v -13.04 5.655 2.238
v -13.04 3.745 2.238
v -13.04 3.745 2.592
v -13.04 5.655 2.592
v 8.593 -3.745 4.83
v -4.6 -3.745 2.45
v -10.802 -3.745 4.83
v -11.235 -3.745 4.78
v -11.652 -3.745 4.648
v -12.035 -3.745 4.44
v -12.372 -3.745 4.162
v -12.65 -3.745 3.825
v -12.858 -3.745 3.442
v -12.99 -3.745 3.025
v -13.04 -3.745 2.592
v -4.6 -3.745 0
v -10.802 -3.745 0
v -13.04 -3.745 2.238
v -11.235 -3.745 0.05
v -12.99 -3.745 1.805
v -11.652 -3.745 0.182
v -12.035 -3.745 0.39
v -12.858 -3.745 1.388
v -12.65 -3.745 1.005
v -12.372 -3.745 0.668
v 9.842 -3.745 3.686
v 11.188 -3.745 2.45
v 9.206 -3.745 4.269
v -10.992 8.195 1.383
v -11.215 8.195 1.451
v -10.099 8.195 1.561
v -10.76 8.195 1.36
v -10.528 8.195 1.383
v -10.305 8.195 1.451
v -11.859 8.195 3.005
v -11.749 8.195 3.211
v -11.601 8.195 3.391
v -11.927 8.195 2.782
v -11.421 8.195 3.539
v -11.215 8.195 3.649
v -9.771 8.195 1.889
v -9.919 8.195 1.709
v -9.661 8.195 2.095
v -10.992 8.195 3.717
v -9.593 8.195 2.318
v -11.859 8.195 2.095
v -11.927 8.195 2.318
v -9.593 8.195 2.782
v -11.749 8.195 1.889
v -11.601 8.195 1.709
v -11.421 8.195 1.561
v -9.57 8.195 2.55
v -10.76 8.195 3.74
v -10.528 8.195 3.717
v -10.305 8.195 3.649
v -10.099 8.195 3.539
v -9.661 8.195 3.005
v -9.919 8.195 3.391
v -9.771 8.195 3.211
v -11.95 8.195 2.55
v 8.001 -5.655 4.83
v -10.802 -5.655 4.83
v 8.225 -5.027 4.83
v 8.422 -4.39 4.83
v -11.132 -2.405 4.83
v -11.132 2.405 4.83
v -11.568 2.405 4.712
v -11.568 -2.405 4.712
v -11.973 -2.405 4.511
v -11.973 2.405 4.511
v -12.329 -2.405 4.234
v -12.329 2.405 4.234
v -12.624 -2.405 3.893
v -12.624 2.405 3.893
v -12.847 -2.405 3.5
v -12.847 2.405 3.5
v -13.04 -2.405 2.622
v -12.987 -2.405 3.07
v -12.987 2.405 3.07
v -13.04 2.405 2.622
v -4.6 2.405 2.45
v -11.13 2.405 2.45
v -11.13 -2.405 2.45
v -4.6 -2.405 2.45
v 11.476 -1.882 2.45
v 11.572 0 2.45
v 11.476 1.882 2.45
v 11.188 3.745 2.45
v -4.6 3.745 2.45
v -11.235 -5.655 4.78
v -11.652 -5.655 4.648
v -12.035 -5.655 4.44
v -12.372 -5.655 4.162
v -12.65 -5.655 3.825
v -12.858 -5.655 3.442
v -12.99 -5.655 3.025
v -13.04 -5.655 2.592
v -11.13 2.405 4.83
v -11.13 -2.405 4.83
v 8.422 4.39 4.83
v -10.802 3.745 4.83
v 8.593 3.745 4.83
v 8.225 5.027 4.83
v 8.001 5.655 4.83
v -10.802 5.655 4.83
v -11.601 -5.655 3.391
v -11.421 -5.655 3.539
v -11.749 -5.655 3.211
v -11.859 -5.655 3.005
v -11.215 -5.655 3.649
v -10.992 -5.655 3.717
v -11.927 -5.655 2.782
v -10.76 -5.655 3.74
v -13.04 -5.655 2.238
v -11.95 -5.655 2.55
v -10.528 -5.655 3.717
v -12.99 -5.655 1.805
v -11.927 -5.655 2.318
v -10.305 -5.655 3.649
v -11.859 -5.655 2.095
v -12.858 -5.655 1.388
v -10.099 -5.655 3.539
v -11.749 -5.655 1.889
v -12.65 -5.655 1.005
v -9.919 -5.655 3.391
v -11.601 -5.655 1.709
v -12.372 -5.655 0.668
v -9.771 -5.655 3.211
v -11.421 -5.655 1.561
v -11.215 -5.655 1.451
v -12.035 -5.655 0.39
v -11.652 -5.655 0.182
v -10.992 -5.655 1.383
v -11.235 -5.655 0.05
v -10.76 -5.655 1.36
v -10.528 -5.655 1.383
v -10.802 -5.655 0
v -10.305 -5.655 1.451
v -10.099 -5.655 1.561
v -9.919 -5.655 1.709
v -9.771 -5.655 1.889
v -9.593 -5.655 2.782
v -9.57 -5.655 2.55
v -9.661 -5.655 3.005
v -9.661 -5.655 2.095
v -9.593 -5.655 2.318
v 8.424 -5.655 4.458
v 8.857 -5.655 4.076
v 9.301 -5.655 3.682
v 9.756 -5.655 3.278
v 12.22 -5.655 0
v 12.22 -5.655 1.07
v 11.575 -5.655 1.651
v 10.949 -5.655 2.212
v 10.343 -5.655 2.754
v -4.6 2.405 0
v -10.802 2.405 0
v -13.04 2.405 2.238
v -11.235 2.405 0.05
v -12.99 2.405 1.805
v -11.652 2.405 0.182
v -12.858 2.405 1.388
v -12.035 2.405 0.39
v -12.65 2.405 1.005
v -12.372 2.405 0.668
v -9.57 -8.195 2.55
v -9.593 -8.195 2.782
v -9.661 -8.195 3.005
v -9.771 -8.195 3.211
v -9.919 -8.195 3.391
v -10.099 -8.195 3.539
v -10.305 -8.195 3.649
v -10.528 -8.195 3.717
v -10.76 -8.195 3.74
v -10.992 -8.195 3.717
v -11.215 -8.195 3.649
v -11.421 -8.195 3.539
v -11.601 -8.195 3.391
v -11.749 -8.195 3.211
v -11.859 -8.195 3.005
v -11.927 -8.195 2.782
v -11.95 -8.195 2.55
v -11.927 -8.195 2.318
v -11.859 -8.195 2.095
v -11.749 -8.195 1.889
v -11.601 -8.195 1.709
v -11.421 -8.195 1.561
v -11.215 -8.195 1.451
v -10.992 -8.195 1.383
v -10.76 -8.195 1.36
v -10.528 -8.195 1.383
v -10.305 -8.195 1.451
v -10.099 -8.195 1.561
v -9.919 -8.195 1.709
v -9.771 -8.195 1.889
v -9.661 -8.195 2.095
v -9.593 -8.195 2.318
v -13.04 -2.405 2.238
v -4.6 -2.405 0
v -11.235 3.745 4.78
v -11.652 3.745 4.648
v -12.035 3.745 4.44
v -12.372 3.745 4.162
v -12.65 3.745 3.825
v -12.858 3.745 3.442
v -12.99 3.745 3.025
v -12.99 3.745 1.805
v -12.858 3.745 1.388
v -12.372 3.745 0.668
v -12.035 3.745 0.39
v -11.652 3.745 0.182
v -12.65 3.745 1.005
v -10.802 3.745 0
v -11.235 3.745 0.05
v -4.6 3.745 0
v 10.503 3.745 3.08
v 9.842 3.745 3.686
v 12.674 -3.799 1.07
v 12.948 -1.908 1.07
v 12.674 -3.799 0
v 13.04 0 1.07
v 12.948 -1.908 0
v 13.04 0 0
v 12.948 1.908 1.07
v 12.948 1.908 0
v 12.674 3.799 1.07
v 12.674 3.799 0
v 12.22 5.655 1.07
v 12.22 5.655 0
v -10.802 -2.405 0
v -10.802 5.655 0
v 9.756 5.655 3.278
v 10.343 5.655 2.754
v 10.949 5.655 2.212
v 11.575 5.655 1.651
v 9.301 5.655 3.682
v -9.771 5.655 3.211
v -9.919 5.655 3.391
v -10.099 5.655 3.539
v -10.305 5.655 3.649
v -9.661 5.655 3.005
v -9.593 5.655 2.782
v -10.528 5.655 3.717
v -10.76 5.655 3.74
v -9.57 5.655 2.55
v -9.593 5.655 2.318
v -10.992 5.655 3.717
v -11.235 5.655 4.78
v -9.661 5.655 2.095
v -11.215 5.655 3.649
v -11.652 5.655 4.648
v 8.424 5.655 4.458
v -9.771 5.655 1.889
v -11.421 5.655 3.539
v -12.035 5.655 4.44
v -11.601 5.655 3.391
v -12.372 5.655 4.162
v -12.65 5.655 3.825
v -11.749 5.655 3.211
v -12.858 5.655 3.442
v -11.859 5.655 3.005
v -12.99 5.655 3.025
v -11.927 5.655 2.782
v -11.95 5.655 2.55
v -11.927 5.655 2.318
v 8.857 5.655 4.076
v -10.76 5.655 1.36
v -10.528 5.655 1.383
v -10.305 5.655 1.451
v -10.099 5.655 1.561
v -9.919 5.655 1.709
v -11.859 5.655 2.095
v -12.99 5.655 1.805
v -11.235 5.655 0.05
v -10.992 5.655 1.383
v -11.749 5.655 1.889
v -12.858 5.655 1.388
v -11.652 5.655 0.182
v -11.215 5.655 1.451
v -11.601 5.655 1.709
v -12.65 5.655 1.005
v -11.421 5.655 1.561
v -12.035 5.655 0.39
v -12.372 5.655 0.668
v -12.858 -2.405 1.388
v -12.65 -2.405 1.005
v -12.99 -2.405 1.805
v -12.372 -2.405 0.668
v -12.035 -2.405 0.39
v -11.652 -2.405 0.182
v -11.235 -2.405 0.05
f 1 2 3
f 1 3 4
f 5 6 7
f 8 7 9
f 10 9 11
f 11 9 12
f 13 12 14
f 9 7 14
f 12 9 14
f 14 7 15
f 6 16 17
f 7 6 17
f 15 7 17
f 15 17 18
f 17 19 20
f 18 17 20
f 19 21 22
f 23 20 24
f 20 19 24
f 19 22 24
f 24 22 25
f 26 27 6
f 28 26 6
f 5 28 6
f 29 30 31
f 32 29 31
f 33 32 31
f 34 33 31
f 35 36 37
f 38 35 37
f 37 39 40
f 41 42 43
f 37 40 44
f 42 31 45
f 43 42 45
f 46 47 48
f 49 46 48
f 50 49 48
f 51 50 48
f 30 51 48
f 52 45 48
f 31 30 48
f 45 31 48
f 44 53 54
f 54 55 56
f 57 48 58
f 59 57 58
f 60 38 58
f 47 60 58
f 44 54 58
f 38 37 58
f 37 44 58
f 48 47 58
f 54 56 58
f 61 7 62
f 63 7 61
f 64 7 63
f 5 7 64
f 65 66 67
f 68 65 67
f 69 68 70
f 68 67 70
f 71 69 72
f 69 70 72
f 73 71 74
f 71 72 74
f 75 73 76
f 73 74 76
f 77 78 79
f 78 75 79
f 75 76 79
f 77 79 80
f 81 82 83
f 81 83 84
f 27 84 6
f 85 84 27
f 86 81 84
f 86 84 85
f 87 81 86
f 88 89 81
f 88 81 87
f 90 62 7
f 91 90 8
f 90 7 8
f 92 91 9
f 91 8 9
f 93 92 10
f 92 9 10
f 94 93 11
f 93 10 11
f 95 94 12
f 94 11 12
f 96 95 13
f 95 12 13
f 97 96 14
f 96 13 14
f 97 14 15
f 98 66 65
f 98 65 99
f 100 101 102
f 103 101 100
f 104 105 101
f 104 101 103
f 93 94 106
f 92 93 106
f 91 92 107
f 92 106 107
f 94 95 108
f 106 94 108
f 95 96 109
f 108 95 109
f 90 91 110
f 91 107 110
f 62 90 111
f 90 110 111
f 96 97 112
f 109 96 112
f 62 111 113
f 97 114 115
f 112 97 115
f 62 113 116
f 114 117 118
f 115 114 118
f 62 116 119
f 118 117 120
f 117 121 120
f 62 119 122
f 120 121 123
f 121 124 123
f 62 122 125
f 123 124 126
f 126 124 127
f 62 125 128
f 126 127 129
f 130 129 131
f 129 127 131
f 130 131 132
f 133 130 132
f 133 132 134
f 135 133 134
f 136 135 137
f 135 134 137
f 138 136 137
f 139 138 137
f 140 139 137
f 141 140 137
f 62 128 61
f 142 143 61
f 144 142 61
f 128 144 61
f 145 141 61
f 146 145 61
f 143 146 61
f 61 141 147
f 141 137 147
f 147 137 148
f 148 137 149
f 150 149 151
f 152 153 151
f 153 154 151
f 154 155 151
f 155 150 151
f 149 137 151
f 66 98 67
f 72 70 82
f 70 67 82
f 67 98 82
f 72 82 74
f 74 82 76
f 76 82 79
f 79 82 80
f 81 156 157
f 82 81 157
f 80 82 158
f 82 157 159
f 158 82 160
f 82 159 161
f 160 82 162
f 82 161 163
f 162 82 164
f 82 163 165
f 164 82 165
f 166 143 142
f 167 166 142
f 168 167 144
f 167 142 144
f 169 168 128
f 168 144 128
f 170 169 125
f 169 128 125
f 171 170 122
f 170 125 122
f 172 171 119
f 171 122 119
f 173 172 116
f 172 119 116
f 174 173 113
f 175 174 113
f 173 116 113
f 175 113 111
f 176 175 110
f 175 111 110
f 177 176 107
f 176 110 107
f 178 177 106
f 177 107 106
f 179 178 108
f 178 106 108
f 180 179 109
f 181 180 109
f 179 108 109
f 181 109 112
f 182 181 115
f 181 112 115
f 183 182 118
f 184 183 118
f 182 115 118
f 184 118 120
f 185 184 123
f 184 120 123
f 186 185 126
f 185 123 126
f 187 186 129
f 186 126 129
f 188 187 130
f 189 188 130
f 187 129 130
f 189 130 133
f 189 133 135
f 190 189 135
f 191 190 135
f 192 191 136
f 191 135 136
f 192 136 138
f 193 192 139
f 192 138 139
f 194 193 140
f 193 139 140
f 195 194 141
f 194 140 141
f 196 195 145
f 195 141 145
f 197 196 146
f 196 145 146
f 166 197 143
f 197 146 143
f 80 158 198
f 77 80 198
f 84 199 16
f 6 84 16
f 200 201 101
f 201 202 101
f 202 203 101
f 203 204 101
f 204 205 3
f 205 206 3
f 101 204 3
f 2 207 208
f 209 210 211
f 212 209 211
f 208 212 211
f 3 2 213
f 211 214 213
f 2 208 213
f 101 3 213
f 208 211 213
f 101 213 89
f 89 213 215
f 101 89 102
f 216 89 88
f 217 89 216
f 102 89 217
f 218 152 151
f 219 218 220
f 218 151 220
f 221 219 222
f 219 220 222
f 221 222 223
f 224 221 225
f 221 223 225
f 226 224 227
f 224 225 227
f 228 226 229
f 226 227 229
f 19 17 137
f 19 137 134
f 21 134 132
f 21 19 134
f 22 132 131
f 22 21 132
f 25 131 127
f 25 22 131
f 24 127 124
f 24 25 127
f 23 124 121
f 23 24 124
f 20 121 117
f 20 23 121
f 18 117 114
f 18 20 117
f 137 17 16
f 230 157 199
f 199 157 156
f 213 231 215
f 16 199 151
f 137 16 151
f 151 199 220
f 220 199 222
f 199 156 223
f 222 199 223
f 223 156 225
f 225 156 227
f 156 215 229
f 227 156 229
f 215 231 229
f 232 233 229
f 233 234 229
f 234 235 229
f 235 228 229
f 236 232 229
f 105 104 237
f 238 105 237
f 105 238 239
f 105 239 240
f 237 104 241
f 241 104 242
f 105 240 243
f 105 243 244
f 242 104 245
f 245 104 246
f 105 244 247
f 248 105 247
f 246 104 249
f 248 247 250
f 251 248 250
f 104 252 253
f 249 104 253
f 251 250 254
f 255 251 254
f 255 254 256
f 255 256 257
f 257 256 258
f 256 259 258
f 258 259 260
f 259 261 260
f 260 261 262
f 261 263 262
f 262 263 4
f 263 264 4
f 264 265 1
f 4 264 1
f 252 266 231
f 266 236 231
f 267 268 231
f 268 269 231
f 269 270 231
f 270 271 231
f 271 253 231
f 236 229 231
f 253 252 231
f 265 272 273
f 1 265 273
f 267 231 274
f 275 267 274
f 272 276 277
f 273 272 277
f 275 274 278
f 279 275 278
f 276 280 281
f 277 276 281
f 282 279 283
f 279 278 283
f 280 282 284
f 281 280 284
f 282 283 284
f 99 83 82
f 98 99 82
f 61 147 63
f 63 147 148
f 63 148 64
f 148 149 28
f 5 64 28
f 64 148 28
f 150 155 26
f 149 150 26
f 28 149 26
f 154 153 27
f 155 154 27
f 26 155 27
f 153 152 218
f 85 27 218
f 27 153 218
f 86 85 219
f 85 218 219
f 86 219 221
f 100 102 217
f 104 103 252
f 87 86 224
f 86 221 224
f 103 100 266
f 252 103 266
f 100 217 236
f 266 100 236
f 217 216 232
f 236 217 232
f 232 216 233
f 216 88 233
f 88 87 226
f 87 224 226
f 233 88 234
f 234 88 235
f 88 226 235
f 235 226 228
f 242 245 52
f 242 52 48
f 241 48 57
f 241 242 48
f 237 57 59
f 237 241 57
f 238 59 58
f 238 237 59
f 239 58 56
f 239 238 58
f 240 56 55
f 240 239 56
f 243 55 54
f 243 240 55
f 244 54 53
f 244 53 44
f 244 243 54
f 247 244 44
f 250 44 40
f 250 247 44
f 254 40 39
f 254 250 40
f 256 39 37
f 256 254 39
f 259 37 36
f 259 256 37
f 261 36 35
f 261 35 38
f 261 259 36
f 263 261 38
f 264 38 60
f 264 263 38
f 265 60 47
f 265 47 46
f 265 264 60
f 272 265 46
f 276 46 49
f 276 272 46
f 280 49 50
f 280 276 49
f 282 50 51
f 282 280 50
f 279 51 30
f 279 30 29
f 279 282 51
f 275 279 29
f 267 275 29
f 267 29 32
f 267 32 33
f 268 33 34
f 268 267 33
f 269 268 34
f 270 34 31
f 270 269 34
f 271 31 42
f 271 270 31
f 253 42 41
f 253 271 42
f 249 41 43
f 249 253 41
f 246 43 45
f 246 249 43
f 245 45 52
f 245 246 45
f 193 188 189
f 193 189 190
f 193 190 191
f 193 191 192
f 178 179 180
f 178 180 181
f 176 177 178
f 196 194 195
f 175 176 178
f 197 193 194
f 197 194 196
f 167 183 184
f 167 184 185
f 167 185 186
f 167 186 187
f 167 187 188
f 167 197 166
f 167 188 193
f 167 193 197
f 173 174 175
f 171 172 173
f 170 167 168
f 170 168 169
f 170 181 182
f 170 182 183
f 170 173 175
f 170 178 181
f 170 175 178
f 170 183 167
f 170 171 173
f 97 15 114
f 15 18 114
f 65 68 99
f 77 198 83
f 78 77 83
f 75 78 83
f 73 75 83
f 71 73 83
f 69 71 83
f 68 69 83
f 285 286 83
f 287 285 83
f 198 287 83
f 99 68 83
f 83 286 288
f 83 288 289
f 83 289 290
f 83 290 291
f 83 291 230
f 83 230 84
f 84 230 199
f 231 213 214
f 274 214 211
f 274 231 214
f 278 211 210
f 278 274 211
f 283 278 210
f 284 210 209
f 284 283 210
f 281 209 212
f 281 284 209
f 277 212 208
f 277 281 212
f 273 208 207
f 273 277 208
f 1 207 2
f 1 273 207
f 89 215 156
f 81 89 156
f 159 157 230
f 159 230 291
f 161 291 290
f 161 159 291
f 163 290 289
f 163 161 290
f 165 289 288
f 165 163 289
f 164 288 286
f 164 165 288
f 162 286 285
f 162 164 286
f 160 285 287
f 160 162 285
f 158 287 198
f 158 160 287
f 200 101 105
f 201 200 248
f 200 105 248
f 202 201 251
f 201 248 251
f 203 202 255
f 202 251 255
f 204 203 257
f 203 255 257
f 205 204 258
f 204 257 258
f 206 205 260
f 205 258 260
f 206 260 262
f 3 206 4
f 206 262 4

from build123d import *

# Parameters (mm, degrees)
F1_DEPTH     = 2.45
F2_W         = 1.91
F2_H         = 1.91
F2_H_2       = 4.81
F3_DEPTH     = 2.38
F4_T1_DEPTH  = 13.3148286025
F4_T3_DEPTH  = 7.6124143012
F4_T5_DEPTH  = 13.3148286025
F4_T7_DEPTH  = 16.0629874681
F4_T9_DEPTH  = 16.2148286025
F4_T14_DEPTH = 13.3148286025
F5_T2_ANGLE  = 64.9142912697
F5_T4_ANGLE  = 64.9142912697
F6_R         = 1.19
F7_DEPTH     = 2.54


# Not quite as in the source:
# - a fillet or chamfer that OpenCascade refuses, or shapes differently, is made with other operations: its cross-section is extruded or revolved along the edge and cut away or added


with BuildPart() as f1:
    # F0 (on Top) → F1 (new body)
    with BuildSketch(Plane.XY):
        Polygon((12.22, -5.655), (12.22, 5.655), (-7.02, 5.655), (-9.51, 5.655), (-13.04, 5.655), (-13.04, 3.745), (-4.6004378237, 3.745), (-4.6004378237, 2.405), (-13.04, 2.405), (-13.04, -2.405), (-4.6004378237, -2.405), (-4.6004378237, -3.745), (-13.04, -3.745), (-13.04, -5.655), (-9.51, -5.655), (-7.02, -5.655), align=None)
        with BuildLine():
            ThreePointArc((12.22, -5.655), (13.04, 0), (12.22, 5.655))
            Line((12.22, 5.655), (12.22, -5.655))
        make_face()
    extrude(amount=F1_DEPTH)

    # F2 (on face) → F3 (join)
    with BuildSketch(Plane.XY.offset(2.45)):
        with BuildLine():
            ThreePointArc((12.6846069362, 3.745), (12.4758901154, 4.705737445), (12.22, 5.655))
            Line((12.22, 5.655), (-11.13, 5.655))
            Line((-11.13, 5.655), (-11.13, 3.745))
            Line((-11.13, 3.745), (-4.6004378237, 3.745))
            Line((-4.6004378237, 3.745), (12.6846069362, 3.745))
        make_face()
        with Locations((-12.085, 4.7)):
            Rectangle(F2_W, F2_H)
        with Locations((-12.085, 0)):
            Rectangle(F2_W, F2_H_2)
        with Locations((-12.085, -4.7)):
            Rectangle(F2_W, F2_H)
        with BuildLine():
            ThreePointArc((12.22, -5.655), (12.4758901154, -4.705737445), (12.6846069362, -3.745))
            Line((12.6846069362, -3.745), (-4.6004378237, -3.745))
            Line((-4.6004378237, -3.745), (-11.13, -3.745))
            Line((-11.13, -3.745), (-11.13, -5.655))
            Line((-11.13, -5.655), (12.22, -5.655))
        make_face()
    extrude(amount=F3_DEPTH)

    # F4: fillet of radius 2.28 on 6 edges, made by hand

    # F4_s2 → F4_t1 (cut)
    with BuildSketch(Plane.XZ.offset(-1.9574143012)):
        with BuildLine():
            ThreePointArc((-10.7590343146, -0.0004), (-12.3722034611, 0.6677965389), (-13.0404, 2.2809656854))
            Line((-13.0404, 2.2809656854), (-13.2685365685, 2.2809656854))
            ThreePointArc((-13.2685365685, 2.2809656854), (-13.2681365685, 1.1404828427), (-13.2681365685, 0))
            Line((-13.2681365685, 0), (-13.04, -0.2281365685))
            ThreePointArc((-13.04, -0.2281365685), (-11.8995171573, -0.2281365685), (-10.7590343146, -0.2285365685))
            Line((-10.7590343146, -0.2285365685), (-10.7590343146, -0.0004))
        make_face()
    extrude(amount=F4_T1_DEPTH, mode=Mode.SUBTRACT)

    # F4_s4 → F4_t3 (cut)
    with BuildSketch(Plane.XZ.offset(-11.3574143012)):
        with BuildLine():
            ThreePointArc((-10.7590343146, 4.8304), (-12.3722034611, 4.1622034611), (-13.0404, 2.5490343146))
            Line((-13.0404, 2.5490343146), (-13.2685365685, 2.5490343146))
            ThreePointArc((-13.2685365685, 2.5490343146), (-13.2681365685, 3.6895171573), (-13.2681365685, 4.83))
            Line((-13.2681365685, 4.83), (-13.04, 5.0581365685))
            ThreePointArc((-13.04, 5.0581365685), (-11.8995171573, 5.0581365685), (-10.7590343146, 5.0585365685))
            Line((-10.7590343146, 5.0585365685), (-10.7590343146, 4.8304))
        make_face()
    extrude(amount=F4_T3_DEPTH, mode=Mode.SUBTRACT)

    # F4_s6 → F4_t5 (cut)
    with BuildSketch(Plane.XZ.offset(-11.3574143012)):
        with BuildLine():
            ThreePointArc((-10.7590343146, -0.0004), (-12.3722034611, 0.6677965389), (-13.0404, 2.2809656854))
            Line((-13.0404, 2.2809656854), (-13.2685365685, 2.2809656854))
            ThreePointArc((-13.2685365685, 2.2809656854), (-13.2681365685, 1.1404828427), (-13.2681365685, 0))
            Line((-13.2681365685, 0), (-13.04, -0.2281365685))
            ThreePointArc((-13.04, -0.2281365685), (-11.8995171573, -0.2281365685), (-10.7590343146, -0.2285365685))
            Line((-10.7590343146, -0.2285365685), (-10.7590343146, -0.0004))
        make_face()
    extrude(amount=F4_T5_DEPTH, mode=Mode.SUBTRACT)

    # F4_s8 → F4_t7 (cut)
    with BuildSketch(Plane.XZ.offset(-8.0314937341)):
        with BuildLine():
            ThreePointArc((-11.1300650541, 4.8303946745), (-12.4984431492, 4.0555753965), (-13.0404, 2.5794025419))
            Line((-13.0404, 2.5794025419), (-13.2685365685, 2.5794025419))
            ThreePointArc((-13.2685365685, 2.5794025419), (-13.2681365685, 3.704701271), (-13.2681365685, 4.83))
            Line((-13.2681365685, 4.83), (-13.04, 5.0581365685))
            ThreePointArc((-13.04, 5.0581365685), (-12.0850325271, 5.0581365685), (-11.1671681281, 5.0554938878))
            Line((-11.1671681281, 5.0554938878), (-11.1300650541, 4.8303946745))
        make_face()
    extrude(amount=F4_T7_DEPTH, mode=Mode.SUBTRACT)

    # F4_s10 → F4_t9 (cut)
    with BuildSketch(Plane.XZ.offset(-8.1074143012)):
        with BuildLine():
            ThreePointArc((-10.7590343146, -0.0004), (-12.3722034611, 0.6677965389), (-13.0404, 2.2809656854))
            Line((-13.0404, 2.2809656854), (-13.2685365685, 2.2809656854))
            ThreePointArc((-13.2685365685, 2.2809656854), (-13.2681365685, 1.1404828427), (-13.2681365685, 0))
            Line((-13.2681365685, 0), (-13.04, -0.2281365685))
            ThreePointArc((-13.04, -0.2281365685), (-11.8995171573, -0.2281365685), (-10.7590343146, -0.2285365685))
            Line((-10.7590343146, -0.2285365685), (-10.7590343146, -0.0004))
        make_face()
    extrude(amount=F4_T9_DEPTH, mode=Mode.SUBTRACT)


with BuildPart() as f4_tool12:
    # F4_s13 → F4_t14 (new body)
    with BuildSketch(Plane.XZ.offset(-1.9574143012)):
        with BuildLine():
            ThreePointArc((-10.7590343146, 4.8304), (-12.3722034611, 4.1622034611), (-13.0404, 2.5490343146))
            Line((-13.0404, 2.5490343146), (-13.2685365685, 2.5490343146))
            ThreePointArc((-13.2685365685, 2.5490343146), (-13.2681365685, 3.6895171573), (-13.2681365685, 4.83))
            Line((-13.2681365685, 4.83), (-13.04, 5.0581365685))
            ThreePointArc((-13.04, 5.0581365685), (-11.8995171573, 5.0581365685), (-10.7590343146, 5.0585365685))
            Line((-10.7590343146, 5.0585365685), (-10.7590343146, 4.8304))
        make_face()
    extrude(amount=F4_T14_DEPTH)

    split(bisect_by=Plane.XZ.offset(2.405), keep=Keep.TOP)


with BuildPart() as f1_1:
    add(f1.part)

    # F4_t11: cut F4_tool12
    add(f4_tool12.part, mode=Mode.SUBTRACT)

    # F5: chamfer of 4 x 3.76 on 2 edges, made by hand

    # F5_s1 → F5_t2 (revolve, cut)
    with BuildSketch(Plane(origin=(-0.7123621612, -2.0942885882, 0), x_dir=(0, 0, 1), z_dir=(-0.3220259314, -0.9467308485, 0))):
        Polygon((4.83, -9.4059274017), (1.07, -13.4059274017), (4.83, -13.4059274017), align=None)
    revolve(axis=Axis((-6.8694054878, 0, 4.83), (0, 0, 1)), revolution_arc=F5_T2_ANGLE, mode=Mode.SUBTRACT)

    # F5_s3 → F5_t4 (revolve, cut)
    with BuildSketch(Plane(origin=(-3.5700040609, -3.4320367849, 0), x_dir=(0, 0, 1), z_dir=(-0.7208995903, -0.6930395232, 0))):
        Polygon((4.83, -11.148635984), (1.07, -15.148635984), (4.83, -15.148635984), align=None)
    revolve(axis=Axis((-6.8694054878, 0, 4.83), (0, 0, 1)), revolution_arc=F5_T4_ANGLE, mode=Mode.SUBTRACT)

    # F6 (on face) → F7 (join)
    with BuildSketch(Plane.XZ.offset(5.655)):
        with Locations((-10.76, 2.55)):
            Circle(F6_R)
    extrude(amount=F7_DEPTH)

    # F8: F1 across plane


with BuildPart() as f1_2:
    add(f1_1.part)
    add(f1_1.part.mirror(Plane.XZ))


solid = f1_2.part
